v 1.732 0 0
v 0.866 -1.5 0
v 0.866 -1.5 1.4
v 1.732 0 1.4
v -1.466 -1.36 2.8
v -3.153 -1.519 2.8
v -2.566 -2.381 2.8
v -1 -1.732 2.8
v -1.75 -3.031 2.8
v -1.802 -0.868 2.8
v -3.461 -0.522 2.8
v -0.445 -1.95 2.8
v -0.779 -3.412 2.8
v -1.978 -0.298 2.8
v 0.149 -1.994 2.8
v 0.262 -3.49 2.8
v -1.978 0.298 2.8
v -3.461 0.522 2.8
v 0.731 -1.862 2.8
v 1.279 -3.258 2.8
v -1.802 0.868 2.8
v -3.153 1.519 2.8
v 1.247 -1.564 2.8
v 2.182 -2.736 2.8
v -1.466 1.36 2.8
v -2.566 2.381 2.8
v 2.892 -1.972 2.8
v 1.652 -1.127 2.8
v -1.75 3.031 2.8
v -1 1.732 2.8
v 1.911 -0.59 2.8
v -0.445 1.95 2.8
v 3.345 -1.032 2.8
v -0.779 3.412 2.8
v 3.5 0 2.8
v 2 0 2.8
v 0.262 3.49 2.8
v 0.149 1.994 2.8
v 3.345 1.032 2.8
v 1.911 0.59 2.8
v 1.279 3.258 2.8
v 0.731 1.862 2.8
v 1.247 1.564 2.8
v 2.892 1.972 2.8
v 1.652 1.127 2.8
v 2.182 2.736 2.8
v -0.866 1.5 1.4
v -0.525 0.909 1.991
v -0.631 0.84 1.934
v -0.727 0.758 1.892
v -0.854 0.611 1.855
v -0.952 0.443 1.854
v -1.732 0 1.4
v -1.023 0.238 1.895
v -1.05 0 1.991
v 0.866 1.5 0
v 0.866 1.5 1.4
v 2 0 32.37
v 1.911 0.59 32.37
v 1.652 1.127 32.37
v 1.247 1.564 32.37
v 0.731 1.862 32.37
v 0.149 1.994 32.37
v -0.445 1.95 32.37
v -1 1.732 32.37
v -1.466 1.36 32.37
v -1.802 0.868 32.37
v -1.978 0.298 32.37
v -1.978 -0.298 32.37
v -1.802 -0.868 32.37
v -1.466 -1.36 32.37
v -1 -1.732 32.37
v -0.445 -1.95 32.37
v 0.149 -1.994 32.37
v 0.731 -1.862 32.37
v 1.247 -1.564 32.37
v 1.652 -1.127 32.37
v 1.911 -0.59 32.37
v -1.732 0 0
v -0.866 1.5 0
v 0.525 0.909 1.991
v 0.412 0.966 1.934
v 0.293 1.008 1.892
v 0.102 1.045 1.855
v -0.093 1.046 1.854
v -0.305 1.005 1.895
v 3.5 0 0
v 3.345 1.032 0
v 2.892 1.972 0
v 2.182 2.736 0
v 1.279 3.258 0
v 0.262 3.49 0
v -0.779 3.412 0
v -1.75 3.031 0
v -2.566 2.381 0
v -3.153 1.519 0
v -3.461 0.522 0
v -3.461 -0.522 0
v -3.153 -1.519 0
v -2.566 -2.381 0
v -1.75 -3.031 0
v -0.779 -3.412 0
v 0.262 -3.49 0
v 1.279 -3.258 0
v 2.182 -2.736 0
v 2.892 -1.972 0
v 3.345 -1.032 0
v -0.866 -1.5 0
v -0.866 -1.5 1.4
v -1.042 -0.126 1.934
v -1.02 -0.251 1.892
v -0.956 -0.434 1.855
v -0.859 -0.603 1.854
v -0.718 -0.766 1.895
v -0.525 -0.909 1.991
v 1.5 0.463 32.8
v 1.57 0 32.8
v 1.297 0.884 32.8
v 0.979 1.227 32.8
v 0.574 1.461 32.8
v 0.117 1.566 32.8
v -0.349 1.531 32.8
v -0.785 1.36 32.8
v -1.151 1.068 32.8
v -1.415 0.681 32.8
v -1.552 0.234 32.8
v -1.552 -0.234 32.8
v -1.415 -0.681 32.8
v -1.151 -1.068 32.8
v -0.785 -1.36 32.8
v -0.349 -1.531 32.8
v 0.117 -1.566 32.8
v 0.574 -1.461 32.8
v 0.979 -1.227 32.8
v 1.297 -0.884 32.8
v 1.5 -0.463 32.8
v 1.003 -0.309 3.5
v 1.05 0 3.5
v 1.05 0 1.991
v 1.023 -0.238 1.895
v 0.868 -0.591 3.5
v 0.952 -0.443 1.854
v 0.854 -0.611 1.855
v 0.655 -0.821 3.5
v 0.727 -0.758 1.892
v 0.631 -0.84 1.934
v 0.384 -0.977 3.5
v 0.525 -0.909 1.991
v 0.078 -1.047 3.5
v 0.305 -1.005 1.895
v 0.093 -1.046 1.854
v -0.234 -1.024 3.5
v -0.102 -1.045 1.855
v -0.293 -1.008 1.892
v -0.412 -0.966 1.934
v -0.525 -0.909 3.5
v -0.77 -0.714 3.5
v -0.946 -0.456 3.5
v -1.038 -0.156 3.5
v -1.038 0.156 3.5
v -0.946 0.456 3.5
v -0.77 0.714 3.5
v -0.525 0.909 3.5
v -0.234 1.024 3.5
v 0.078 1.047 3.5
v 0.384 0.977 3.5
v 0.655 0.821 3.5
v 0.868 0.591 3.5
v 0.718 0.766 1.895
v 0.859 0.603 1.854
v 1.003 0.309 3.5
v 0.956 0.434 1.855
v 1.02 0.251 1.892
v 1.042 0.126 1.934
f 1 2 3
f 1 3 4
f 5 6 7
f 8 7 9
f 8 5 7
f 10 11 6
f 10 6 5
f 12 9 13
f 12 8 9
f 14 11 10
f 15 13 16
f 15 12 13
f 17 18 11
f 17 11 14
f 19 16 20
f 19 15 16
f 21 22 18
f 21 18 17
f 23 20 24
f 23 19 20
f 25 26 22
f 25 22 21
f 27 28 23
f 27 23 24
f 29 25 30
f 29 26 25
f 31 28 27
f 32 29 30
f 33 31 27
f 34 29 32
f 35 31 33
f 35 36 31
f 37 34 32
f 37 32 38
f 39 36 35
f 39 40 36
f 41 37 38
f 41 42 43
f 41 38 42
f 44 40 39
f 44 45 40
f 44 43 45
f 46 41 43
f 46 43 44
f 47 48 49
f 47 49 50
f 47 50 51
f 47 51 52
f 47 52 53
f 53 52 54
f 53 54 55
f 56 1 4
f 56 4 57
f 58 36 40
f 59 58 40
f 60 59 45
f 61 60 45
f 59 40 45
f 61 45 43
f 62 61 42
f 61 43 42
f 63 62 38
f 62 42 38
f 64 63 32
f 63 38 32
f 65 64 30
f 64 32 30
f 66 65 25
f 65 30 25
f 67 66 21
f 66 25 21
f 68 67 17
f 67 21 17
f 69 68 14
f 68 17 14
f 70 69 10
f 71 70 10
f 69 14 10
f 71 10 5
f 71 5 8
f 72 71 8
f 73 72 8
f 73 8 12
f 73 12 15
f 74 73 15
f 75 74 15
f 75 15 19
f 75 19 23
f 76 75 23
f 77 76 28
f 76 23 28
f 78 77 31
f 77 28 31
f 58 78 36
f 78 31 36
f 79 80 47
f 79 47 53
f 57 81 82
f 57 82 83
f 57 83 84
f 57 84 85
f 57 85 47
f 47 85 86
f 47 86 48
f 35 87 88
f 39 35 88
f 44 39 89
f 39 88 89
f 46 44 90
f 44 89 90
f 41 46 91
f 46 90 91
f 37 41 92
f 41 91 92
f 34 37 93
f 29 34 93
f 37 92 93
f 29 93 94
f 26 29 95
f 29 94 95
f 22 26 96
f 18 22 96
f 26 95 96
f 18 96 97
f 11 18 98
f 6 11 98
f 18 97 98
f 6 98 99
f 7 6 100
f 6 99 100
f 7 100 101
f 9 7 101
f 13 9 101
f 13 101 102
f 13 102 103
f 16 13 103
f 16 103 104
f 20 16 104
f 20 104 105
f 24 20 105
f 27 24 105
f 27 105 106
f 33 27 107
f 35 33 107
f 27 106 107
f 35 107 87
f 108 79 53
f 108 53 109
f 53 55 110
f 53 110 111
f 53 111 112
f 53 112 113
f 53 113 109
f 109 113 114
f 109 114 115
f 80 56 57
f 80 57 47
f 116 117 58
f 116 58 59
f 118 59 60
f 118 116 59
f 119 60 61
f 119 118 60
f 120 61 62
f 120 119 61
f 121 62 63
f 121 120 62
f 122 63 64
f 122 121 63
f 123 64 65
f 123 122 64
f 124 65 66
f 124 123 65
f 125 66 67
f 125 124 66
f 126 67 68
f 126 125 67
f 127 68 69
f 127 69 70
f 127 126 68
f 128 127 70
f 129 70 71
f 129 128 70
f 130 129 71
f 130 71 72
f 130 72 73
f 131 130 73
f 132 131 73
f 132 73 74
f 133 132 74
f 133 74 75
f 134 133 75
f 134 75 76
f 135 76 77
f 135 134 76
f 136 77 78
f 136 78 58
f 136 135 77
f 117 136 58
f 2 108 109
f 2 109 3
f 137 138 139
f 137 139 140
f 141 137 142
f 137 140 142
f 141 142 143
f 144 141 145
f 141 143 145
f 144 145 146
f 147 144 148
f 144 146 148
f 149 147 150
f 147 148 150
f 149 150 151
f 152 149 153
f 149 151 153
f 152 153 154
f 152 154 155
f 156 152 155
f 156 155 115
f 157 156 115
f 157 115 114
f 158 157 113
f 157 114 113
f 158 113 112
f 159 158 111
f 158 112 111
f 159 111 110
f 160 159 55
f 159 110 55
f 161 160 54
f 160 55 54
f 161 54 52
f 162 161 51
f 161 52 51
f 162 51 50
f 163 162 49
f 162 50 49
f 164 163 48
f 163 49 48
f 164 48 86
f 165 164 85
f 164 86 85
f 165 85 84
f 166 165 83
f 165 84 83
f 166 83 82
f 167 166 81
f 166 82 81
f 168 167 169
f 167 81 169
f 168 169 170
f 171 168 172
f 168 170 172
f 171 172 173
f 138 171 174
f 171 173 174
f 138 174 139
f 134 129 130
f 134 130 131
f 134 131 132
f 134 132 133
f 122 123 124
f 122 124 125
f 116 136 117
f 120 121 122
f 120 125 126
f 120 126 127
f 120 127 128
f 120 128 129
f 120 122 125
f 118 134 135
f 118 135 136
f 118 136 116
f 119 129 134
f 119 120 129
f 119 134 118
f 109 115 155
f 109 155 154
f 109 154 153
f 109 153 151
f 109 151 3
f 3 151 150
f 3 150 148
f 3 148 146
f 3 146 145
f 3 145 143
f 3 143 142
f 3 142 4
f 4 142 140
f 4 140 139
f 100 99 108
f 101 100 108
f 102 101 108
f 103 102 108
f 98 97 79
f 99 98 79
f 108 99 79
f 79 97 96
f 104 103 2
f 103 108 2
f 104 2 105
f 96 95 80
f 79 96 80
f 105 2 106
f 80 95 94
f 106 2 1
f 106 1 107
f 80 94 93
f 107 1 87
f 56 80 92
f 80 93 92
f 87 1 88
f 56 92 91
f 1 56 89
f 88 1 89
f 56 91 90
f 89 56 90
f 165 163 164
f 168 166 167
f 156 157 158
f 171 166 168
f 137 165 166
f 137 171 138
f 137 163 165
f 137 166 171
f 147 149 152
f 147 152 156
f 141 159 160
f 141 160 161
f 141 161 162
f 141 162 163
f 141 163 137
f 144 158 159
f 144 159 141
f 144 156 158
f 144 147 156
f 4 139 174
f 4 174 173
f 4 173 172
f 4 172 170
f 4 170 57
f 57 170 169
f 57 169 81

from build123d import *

# Parameters (mm, degrees)
SKETCH_R        = 3.5
PAD_DEPTH       = 2.8
SKETCH001_R     = 2
PAD001_DEPTH    = 30
CHAMFER_SIZE    = 0.43
POCKET_DEPTH    = 2
CHAMFER001_SIZE = 0.6
SKETCH003_R     = 1.05
POCKET001_DEPTH = 1.5


with BuildPart() as part:
    # Sketch → Pad (new body)
    with BuildSketch(Plane.XY):
        Circle(SKETCH_R)
    extrude(amount=PAD_DEPTH)

    # Sketch001 → Pad001 (new body)
    with BuildSketch(Plane.XY.offset(2.8)):
        Circle(SKETCH001_R)
    extrude(amount=PAD001_DEPTH)

    # Chamfer
    chamfer_edges = [part.edges().sort_by_distance(p)[0] for p in [
        (-2, 0, 32.8),
    ]]
    chamfer(chamfer_edges, length=CHAMFER_SIZE)

    # Sketch002 → Pocket (cut)
    with BuildSketch(Plane(origin=(0, 0, 0), x_dir=(1, 0, 0), z_dir=(0, 0, -1))):
        Polygon((-0.866025, 1.5), (0.866025, 1.5), (1.732051, 0), (0.866025, -1.5), (-0.866025, -1.5), (-1.732051, 0), align=None)
    extrude(amount=-POCKET_DEPTH, mode=Mode.SUBTRACT)

    # Chamfer001
    chamfer001_edges = [part.edges().sort_by_distance(p)[0] for p in [
        (0, -1.5, 2),
        (1.299038, -0.75, 2),
        (1.299038, 0.75, 2),
        (0, 1.5, 2),
        (-1.299038, 0.75, 2),
        (-1.299038, -0.75, 2),
    ]]
    chamfer(chamfer001_edges, length=CHAMFER001_SIZE)

    # Sketch003 → Pocket001 (cut, symmetric)
    with BuildSketch(Plane(origin=(0, 0, 2), x_dir=(1, 0, 0), z_dir=(0, 0, -1))):
        Circle(SKETCH003_R)
    extrude(amount=POCKET001_DEPTH, both=True, mode=Mode.SUBTRACT)


solid = part.part
